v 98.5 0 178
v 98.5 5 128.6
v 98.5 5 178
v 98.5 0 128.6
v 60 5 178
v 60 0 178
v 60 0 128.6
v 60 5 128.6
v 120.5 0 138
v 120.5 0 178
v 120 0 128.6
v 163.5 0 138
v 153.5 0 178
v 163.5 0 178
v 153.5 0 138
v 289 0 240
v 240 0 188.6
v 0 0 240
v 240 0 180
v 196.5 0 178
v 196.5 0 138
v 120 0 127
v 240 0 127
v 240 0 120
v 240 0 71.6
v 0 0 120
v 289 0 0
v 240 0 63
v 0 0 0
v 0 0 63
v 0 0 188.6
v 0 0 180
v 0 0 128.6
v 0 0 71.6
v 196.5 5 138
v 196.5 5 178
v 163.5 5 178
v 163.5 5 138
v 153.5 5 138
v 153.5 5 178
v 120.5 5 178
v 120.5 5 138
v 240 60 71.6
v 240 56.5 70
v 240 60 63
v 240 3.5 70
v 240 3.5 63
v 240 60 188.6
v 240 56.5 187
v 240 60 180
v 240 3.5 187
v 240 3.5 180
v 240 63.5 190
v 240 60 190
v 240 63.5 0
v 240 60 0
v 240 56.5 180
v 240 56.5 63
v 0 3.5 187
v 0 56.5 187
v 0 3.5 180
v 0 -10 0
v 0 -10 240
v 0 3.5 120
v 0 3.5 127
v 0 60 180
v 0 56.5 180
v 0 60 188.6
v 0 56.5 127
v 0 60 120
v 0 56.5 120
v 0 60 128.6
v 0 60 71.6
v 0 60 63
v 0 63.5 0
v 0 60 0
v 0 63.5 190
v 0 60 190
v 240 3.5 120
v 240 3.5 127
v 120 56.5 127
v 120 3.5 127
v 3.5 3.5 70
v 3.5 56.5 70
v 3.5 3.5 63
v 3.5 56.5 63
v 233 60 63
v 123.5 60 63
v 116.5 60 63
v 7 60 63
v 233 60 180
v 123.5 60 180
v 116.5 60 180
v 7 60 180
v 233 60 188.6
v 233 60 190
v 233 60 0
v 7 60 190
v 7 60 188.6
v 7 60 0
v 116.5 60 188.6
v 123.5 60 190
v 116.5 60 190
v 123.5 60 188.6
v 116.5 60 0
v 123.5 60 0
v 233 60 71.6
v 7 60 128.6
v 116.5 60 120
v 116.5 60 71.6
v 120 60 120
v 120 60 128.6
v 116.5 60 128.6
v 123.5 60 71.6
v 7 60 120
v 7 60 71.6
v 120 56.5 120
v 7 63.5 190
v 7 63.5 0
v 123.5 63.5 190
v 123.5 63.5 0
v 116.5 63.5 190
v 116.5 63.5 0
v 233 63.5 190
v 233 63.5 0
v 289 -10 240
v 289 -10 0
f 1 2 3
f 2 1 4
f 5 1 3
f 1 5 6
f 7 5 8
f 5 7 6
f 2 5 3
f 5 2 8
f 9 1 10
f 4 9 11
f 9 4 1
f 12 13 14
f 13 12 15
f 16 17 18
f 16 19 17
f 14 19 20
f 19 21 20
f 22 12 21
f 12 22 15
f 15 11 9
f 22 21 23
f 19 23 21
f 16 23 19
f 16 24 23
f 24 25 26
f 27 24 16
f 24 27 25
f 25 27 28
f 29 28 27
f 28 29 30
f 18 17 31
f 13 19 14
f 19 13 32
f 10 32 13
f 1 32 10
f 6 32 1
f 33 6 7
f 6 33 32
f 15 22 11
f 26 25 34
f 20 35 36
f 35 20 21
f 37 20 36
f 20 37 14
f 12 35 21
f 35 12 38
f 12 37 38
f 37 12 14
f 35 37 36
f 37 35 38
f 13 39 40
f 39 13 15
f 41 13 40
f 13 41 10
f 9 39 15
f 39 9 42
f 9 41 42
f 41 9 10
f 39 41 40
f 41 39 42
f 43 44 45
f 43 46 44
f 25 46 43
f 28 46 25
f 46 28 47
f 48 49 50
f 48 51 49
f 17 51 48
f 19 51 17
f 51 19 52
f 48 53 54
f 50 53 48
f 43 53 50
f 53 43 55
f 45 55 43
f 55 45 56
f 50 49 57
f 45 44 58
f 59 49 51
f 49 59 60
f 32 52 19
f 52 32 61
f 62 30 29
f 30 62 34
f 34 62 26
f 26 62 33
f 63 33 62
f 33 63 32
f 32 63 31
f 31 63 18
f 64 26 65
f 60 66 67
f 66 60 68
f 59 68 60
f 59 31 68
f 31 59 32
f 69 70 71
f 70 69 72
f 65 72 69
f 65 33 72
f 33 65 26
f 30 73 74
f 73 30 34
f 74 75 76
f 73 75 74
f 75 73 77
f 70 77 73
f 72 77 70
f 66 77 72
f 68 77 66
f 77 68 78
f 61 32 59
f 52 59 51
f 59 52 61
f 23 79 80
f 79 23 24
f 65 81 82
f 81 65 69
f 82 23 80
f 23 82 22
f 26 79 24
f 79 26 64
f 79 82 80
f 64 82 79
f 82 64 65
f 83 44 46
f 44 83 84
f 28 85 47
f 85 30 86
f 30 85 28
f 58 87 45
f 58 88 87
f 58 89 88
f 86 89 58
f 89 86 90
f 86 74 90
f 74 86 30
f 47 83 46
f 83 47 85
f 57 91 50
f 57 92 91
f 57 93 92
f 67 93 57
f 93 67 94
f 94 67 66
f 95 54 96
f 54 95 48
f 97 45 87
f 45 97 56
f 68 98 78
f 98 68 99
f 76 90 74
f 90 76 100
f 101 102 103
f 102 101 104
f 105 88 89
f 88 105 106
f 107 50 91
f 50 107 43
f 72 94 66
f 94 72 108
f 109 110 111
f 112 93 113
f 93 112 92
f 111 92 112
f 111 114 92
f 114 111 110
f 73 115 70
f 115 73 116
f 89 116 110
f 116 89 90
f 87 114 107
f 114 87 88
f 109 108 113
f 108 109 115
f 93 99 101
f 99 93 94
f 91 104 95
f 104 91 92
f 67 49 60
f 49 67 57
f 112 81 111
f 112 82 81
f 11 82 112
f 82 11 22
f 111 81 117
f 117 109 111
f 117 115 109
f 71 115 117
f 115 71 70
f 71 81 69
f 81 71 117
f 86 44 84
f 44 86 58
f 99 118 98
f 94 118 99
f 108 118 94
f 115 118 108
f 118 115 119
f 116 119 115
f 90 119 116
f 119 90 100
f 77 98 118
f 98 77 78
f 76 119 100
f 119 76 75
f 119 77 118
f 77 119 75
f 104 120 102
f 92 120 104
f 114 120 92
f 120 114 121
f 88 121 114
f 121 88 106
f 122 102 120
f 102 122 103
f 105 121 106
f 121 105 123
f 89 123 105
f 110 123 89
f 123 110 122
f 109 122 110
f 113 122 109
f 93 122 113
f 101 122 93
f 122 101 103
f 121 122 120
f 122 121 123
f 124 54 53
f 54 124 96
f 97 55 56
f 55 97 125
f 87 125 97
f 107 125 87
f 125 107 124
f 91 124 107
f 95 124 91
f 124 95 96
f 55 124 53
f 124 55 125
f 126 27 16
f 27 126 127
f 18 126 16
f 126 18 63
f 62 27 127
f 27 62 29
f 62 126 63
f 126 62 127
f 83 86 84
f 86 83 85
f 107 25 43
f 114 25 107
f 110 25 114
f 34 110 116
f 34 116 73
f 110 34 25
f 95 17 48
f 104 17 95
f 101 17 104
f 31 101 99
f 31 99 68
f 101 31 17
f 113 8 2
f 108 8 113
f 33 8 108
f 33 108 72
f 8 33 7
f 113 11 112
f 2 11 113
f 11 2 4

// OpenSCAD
//unit: cm
// 190 cm x 3
// 120 cm x 11
// 63 cm x 6
// 53 cm x 13 (5 + 3 + 5)

door_height = 198.5;
door_width = 66;

ceiling_height = 272;
wall_width = 289;
wall_height = 240;

size_a = 7;
size_b = 3.5;

layer_1_z = 63; // table top will be 63 + 7 + 3 = 73 cm;
layer_2_z = 120; // panel top will be 120 + 7 = 127, layer-2 height = 45 cm;
layer_3_z = 180;

panel_width = 60;
support_length = panel_width - size_b * 2;
echo(support_length=support_length);

shelf_top_extra = 3; // TODO
shelf_height = layer_3_z + size_a + shelf_top_extra;
echo(shelf_height=shelf_height);

shelf_width = 240;  // good for ply wood 120 x 60

ebox_large_x = 60;
ebox_large_h = 50;
ebox_large_w = 38.5;
ebox_large_z = 128;
ebox_top_z = ebox_large_z + ebox_large_h; // 178

ebox_offset = 92.5;
ebox_w = 33;
ebox_h = 40;
ebox_z = 140;

side_grid_with = 60;
column_1_x = shelf_width/2 - size_a/2;
column_2_x = shelf_width - side_grid_with;

module person() {
    color("purple") translate([shelf_width/2, panel_width + 30, 0]) cylinder(r=20, h=165);
}

module layer_1_panel() {
    color("white") translate([0,0,layer_1_z + size_a]) cube([shelf_width, panel_width, 1.6]);
}

module layer_3_panel() {
    color("white") translate([0,0,layer_3_z + size_a]) cube([shelf_width, panel_width, 1.6]);
}

module layer_2_panel() {
    color("white") translate([0,0,layer_2_z + size_a]) cube([shelf_width/2, panel_width, 1.6]);
}

module layer_2_panel_2() {
    color("white") translate([column_2_x,0,layer_2_z + size_a]) cube([side_grid_with, panel_width, 1.6]);
}

module wall() {
    translate([0,-10,0]) cube([wall_width, 10, wall_height]);
}

module ebox_large() {
    translate([ebox_large_x, 0, ebox_top_z - ebox_large_h]) cube([ebox_large_w, 5, ebox_large_h]);
}

module ebox_small_1() {
    translate([wall_width - ebox_offset - ebox_w, 0, ebox_top_z - ebox_h]) cube([ebox_w, 5, ebox_h]);
}

module ebox_small_2() {
    translate([-(ebox_w+10),0,0]) ebox_small_1();
}

module row(width=shelf_width) {
    cube([width, size_b, size_a]);
}

module rows_back() {
    translate([0, 0, layer_3_z]) row();
    translate([0, 0, layer_2_z]) row();
    translate([0, 0, layer_1_z]) row();
}

module rows_front() {
    translate([0, panel_width-size_b, layer_3_z]) row();
    translate([0, panel_width-size_b, layer_2_z]) row(width=shelf_width/2);
    // translate([column_2_x, panel_width-size_b, layer_2_z]) row(width=side_grid_with);
    translate([0, panel_width-size_b, layer_1_z]) row();
}

module column() {
    color("red") translate([0, size_b * 2 + support_length]) cube([size_a, size_b, shelf_height]);
}

module columns() {
    column();
    translate([column_1_x, 0, 0]) column();
    translate([shelf_width - size_a, 0, 0]) column();
}

module support() {
    translate([0, size_b, layer_1_z]) cube([size_b, support_length, size_a]);
}

module layer_1_supports() {
    support();
}


wall();
//person();

color("white") {
    ebox_large();
    ebox_small_1();
    ebox_small_2();
}

color("blue") rows_back();
color("yellow") rows_front();

columns();
support();
layer_1_panel();
layer_3_panel();
layer_2_panel();
